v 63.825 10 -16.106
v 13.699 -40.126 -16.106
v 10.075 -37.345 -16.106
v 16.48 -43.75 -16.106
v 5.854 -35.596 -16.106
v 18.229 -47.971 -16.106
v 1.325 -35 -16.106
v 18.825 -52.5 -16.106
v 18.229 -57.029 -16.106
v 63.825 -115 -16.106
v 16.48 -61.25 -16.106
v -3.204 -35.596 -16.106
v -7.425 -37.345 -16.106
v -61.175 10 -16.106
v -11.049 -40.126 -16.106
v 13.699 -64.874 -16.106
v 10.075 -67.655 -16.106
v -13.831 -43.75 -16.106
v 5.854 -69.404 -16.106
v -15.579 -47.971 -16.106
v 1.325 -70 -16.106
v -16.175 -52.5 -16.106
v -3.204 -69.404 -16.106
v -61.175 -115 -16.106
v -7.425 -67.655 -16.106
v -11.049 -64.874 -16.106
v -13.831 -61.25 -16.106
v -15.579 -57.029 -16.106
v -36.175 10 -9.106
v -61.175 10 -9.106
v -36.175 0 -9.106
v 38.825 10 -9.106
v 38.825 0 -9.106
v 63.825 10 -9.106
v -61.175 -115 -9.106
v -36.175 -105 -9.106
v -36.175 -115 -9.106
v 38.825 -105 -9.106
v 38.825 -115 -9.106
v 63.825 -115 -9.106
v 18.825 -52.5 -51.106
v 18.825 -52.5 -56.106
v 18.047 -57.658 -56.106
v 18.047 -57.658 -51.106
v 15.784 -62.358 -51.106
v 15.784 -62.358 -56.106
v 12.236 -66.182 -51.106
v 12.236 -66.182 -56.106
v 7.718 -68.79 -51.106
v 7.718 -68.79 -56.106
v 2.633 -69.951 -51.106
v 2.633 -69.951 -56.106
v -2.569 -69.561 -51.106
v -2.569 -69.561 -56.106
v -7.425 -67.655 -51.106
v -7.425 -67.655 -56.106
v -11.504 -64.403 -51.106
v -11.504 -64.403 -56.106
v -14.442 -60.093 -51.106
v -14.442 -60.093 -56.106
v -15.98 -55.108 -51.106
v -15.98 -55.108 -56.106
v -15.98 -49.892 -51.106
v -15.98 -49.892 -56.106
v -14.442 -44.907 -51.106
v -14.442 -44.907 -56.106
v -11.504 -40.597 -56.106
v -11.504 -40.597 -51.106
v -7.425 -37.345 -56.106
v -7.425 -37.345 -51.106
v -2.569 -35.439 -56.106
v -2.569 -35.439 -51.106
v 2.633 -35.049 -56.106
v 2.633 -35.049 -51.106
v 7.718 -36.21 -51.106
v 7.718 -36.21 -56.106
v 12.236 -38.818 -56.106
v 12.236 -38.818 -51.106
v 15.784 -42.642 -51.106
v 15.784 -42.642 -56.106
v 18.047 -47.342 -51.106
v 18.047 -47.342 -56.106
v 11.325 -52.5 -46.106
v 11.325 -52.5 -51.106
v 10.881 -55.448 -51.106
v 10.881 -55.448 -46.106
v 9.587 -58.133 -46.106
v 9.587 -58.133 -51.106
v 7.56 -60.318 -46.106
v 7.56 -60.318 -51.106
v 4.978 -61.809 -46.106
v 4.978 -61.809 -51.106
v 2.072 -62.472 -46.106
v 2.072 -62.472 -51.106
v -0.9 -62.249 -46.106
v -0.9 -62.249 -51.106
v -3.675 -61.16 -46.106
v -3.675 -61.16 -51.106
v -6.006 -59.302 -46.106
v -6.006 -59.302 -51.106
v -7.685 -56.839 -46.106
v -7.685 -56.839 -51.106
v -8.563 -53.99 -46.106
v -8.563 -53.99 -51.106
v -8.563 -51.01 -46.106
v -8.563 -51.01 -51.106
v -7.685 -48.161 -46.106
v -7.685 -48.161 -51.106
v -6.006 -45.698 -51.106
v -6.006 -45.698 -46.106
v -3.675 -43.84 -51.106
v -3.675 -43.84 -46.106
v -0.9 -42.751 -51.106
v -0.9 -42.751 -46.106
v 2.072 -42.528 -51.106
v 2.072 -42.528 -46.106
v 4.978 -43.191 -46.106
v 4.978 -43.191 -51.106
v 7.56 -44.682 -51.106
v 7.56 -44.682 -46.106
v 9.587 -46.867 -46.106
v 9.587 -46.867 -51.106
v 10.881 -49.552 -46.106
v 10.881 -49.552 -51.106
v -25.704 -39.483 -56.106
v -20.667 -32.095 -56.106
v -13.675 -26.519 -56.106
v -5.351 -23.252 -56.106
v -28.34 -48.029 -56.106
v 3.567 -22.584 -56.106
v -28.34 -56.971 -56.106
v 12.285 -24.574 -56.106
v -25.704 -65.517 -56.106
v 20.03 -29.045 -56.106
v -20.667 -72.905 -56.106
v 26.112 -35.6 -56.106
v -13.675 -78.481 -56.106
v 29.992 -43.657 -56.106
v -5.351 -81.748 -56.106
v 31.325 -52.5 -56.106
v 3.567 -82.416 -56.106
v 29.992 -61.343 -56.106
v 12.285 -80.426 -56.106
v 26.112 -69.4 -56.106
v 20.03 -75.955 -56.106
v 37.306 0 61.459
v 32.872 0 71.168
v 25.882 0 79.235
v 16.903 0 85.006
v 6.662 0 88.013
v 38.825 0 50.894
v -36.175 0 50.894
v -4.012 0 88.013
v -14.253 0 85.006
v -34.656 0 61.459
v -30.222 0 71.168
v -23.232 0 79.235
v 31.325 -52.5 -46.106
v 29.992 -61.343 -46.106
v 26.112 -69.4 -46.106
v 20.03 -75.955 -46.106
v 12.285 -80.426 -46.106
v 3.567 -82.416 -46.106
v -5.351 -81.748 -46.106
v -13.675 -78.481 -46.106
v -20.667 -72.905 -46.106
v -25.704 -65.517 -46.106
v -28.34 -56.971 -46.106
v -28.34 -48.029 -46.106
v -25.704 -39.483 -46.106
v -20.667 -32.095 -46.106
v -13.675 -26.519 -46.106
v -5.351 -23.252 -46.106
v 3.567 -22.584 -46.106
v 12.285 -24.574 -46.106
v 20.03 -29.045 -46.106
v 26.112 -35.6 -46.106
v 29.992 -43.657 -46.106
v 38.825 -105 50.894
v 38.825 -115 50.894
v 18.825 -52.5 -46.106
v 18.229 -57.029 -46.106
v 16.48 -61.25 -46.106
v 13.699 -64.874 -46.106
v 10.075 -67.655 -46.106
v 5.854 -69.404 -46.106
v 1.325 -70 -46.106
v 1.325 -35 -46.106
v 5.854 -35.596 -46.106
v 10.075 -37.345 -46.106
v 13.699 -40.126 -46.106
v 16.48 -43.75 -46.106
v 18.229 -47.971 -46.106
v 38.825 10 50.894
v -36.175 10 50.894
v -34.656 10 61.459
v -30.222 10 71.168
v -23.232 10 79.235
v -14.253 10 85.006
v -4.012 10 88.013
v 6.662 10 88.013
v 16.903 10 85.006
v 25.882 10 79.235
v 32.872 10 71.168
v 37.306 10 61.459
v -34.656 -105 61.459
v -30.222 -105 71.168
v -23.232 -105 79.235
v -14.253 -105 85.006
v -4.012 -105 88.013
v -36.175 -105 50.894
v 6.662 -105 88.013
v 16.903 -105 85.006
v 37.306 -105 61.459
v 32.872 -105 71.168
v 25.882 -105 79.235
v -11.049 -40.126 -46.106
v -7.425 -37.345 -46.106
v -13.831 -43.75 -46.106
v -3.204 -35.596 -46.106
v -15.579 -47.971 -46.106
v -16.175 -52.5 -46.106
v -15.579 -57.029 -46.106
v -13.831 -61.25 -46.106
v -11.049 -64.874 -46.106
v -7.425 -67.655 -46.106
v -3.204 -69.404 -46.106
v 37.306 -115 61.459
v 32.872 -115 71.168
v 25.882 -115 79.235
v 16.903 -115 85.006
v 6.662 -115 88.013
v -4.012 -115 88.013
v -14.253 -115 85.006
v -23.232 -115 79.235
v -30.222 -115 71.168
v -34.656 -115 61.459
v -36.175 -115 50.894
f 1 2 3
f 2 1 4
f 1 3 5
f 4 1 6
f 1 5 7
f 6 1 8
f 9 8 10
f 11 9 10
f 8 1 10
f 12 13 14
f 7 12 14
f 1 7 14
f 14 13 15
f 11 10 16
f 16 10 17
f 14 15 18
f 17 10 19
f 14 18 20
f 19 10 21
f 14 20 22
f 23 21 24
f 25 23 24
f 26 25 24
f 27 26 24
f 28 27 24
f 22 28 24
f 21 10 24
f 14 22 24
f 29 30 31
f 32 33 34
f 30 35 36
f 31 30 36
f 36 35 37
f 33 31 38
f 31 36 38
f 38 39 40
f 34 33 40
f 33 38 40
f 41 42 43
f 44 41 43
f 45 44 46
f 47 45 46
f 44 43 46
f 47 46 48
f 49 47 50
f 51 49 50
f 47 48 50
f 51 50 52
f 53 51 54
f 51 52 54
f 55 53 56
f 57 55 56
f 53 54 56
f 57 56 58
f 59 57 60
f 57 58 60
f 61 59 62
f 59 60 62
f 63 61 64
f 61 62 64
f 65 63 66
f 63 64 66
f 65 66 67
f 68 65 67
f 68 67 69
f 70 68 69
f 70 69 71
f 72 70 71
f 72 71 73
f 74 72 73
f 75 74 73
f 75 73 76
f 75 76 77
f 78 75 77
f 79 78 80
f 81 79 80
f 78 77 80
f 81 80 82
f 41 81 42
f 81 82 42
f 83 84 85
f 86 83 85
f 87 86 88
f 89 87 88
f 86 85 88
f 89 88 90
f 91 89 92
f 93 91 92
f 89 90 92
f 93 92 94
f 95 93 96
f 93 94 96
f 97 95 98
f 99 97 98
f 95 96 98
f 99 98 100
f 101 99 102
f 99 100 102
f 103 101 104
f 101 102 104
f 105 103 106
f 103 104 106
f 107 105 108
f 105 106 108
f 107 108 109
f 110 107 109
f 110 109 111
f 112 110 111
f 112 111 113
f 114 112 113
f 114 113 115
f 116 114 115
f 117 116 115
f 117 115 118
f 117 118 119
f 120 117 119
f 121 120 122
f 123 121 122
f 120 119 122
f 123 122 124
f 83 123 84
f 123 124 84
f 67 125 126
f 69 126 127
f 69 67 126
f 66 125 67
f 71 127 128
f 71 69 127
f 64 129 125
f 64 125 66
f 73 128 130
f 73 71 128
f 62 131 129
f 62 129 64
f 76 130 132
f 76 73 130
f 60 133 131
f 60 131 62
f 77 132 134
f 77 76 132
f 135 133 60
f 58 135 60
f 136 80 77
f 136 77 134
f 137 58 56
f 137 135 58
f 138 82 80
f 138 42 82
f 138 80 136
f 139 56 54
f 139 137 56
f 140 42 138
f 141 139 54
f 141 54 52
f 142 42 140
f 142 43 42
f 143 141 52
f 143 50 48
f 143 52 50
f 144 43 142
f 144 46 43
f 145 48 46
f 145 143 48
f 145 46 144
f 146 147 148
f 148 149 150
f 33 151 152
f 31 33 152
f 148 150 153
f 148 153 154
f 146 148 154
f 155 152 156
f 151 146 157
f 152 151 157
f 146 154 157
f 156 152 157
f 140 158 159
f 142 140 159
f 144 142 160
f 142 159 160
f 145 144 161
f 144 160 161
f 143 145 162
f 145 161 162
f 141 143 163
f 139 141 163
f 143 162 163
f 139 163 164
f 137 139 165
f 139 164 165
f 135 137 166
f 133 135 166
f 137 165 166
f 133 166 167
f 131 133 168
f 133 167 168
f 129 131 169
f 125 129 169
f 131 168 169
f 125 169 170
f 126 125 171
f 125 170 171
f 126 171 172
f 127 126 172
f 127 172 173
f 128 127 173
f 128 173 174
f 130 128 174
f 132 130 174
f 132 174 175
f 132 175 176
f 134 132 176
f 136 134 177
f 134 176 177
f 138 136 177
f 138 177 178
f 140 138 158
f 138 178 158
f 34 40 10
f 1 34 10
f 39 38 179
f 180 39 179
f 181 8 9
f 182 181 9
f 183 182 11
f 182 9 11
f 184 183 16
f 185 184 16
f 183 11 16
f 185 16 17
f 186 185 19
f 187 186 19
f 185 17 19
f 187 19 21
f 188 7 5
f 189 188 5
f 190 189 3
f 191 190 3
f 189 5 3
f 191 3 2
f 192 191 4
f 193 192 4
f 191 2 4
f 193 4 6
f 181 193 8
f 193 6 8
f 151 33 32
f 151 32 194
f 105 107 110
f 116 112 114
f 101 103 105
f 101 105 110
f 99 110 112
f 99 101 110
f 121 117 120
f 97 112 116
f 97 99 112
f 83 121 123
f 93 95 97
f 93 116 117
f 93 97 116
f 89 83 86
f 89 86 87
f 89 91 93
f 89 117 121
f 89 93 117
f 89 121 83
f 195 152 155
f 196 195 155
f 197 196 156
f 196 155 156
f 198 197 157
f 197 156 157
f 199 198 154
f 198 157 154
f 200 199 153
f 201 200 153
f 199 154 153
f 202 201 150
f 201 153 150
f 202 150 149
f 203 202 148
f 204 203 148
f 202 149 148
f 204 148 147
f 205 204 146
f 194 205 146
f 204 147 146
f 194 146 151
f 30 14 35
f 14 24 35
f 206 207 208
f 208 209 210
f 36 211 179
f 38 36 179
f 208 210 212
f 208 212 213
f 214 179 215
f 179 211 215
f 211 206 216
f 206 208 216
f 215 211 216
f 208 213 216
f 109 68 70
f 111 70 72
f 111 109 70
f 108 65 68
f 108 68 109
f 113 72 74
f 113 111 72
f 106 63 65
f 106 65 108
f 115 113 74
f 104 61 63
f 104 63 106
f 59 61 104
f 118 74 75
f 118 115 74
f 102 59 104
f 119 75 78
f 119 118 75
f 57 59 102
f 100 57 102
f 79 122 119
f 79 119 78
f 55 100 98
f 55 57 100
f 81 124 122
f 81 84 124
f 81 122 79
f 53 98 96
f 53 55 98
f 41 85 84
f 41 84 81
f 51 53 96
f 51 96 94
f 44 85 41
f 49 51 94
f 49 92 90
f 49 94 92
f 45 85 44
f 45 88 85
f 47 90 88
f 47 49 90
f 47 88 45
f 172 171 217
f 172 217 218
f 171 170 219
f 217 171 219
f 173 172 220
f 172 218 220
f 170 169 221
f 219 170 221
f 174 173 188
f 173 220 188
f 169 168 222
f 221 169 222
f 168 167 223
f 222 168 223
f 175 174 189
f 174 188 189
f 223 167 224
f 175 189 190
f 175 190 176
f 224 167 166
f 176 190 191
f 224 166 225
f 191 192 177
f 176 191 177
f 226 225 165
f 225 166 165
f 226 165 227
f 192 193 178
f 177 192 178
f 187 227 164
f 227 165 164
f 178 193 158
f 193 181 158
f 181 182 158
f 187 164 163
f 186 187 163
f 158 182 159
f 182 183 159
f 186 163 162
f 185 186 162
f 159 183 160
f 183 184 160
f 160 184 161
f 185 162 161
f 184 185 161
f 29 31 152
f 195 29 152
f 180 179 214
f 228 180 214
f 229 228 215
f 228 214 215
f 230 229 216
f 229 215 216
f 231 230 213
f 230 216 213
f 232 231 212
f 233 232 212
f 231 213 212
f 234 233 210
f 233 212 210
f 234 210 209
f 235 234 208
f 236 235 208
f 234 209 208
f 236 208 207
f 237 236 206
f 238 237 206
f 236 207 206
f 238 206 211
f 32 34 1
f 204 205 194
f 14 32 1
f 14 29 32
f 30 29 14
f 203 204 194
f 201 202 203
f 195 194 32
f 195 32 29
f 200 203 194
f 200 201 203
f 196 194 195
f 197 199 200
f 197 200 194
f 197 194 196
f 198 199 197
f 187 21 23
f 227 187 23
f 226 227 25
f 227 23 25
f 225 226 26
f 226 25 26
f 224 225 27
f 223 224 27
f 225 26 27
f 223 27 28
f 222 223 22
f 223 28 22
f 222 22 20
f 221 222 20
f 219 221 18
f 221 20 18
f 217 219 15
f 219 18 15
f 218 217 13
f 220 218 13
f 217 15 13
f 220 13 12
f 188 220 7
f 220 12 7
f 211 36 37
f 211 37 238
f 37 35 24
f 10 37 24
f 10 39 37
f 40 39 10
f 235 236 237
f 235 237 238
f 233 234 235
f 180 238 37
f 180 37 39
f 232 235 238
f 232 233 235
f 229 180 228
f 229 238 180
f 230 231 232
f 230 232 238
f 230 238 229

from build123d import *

# Parameters (mm, degrees)
F0_W      = 125
F0_H      = 7
F1_DEPTH  = 105
F2_W      = 75
F2_H      = 60
F3_DEPTH  = 10
F4_W      = 75
F4_H      = 60
F5_DEPTH  = 10
F7_DEPTH  = 30
F8_R      = 30
F9_DEPTH  = 10
F10_R     = 17.5
F11_DEPTH = 5
F12_R     = 10
F13_DEPTH = 5


with BuildPart() as f1:
    # F0 (on Front) → F1 (new body)
    with BuildSketch(Plane.XZ):
        with Locations((1.324901, -12.605666)):
            Rectangle(F0_W, F0_H)
    extrude(amount=F1_DEPTH)

    # F2 (on face) → F3 (join)
    with BuildSketch(Plane.XZ.offset(105)):
        Polygon((-61.175099, -9.105666), (-61.175099, -16.105666), (63.824901, -16.105666), (63.824901, -9.105666), (38.824901, -9.105666), (-36.175099, -9.105666), align=None)
        with Locations((1.324901, 20.894334)):
            Rectangle(F2_W, F2_H)
        with BuildLine():
            ThreePointArc((38.824901, 50.894334), (1.324901, 88.394334), (-36.175099, 50.894334))
            Line((-36.175099, 50.894334), (38.824901, 50.894334))
        make_face()
    extrude(amount=F3_DEPTH)

    # F4 (on face) → F5 (join)
    with BuildSketch(Plane(origin=(0, 0, 0), x_dir=(-1, 0, 0), z_dir=(0, 1, 0))):
        Polygon((-63.824901, -9.105666), (-63.824901, -16.105666), (61.175099, -16.105666), (61.175099, -9.105666), (36.175099, -9.105666), (-38.824901, -9.105666), align=None)
        with Locations((-1.324901, 20.894334)):
            Rectangle(F4_W, F4_H)
        with BuildLine():
            ThreePointArc((36.175099, 50.894334), (-1.324901, 88.394334), (-38.824901, 50.894334))
            Line((-38.824901, 50.894334), (36.175099, 50.894334))
        make_face()
    extrude(amount=F5_DEPTH)

    # F6 (on face) → F7 (join)
    with BuildSketch(Plane(origin=(0, 0, -16.105666), x_dir=(1, 0, 0), z_dir=(0, 0, -1))):
        with BuildLine():
            ThreePointArc((18.824901, 52.5), (13.699269, 64.874369), (1.324901, 70))
            Line((1.324901, 70), (1.324901, 52.5))
            Line((1.324901, 52.5), (18.824901, 52.5))
        make_face()
        with BuildLine():
            Line((1.324901, 52.5), (1.324901, 70))
            ThreePointArc((1.324901, 70), (-11.049468, 64.874369), (-16.175099, 52.5))
            Line((-16.175099, 52.5), (1.324901, 52.5))
        make_face()
        with BuildLine():
            Line((18.824901, 52.5), (1.324901, 52.5))
            Line((1.324901, 52.5), (1.324901, 35))
            ThreePointArc((1.324901, 35), (13.699269, 40.125631), (18.824901, 52.5))
        make_face()
        with BuildLine():
            Line((1.324901, 35), (1.324901, 52.5))
            Line((1.324901, 52.5), (-16.175099, 52.5))
            ThreePointArc((-16.175099, 52.5), (-11.049468, 40.125631), (1.324901, 35))
        make_face()
    extrude(amount=F7_DEPTH)

    # F8 (on face) → F9 (join)
    with BuildSketch(Plane(origin=(0, 0, -46.105666), x_dir=(1, 0, 0), z_dir=(0, 0, -1))):
        with Locations((1.324901, 52.5)):
            Circle(F8_R)
    extrude(amount=F9_DEPTH)

    # F10 (on face) → F11 (cut)
    with BuildSketch(Plane(origin=(0, 0, -56.105666), x_dir=(1, 0, 0), z_dir=(0, 0, -1))):
        with Locations((1.324901, 52.5)):
            Circle(F10_R)
    extrude(amount=-F11_DEPTH, mode=Mode.SUBTRACT)

    # F12 (on face) → F13 (cut)
    with BuildSketch(Plane(origin=(0, 0, -51.105666), x_dir=(1, 0, 0), z_dir=(0, 0, -1))):
        with Locations((1.324901, 52.5)):
            Circle(F12_R)
    extrude(amount=-F13_DEPTH, mode=Mode.SUBTRACT)


solid = f1.part
